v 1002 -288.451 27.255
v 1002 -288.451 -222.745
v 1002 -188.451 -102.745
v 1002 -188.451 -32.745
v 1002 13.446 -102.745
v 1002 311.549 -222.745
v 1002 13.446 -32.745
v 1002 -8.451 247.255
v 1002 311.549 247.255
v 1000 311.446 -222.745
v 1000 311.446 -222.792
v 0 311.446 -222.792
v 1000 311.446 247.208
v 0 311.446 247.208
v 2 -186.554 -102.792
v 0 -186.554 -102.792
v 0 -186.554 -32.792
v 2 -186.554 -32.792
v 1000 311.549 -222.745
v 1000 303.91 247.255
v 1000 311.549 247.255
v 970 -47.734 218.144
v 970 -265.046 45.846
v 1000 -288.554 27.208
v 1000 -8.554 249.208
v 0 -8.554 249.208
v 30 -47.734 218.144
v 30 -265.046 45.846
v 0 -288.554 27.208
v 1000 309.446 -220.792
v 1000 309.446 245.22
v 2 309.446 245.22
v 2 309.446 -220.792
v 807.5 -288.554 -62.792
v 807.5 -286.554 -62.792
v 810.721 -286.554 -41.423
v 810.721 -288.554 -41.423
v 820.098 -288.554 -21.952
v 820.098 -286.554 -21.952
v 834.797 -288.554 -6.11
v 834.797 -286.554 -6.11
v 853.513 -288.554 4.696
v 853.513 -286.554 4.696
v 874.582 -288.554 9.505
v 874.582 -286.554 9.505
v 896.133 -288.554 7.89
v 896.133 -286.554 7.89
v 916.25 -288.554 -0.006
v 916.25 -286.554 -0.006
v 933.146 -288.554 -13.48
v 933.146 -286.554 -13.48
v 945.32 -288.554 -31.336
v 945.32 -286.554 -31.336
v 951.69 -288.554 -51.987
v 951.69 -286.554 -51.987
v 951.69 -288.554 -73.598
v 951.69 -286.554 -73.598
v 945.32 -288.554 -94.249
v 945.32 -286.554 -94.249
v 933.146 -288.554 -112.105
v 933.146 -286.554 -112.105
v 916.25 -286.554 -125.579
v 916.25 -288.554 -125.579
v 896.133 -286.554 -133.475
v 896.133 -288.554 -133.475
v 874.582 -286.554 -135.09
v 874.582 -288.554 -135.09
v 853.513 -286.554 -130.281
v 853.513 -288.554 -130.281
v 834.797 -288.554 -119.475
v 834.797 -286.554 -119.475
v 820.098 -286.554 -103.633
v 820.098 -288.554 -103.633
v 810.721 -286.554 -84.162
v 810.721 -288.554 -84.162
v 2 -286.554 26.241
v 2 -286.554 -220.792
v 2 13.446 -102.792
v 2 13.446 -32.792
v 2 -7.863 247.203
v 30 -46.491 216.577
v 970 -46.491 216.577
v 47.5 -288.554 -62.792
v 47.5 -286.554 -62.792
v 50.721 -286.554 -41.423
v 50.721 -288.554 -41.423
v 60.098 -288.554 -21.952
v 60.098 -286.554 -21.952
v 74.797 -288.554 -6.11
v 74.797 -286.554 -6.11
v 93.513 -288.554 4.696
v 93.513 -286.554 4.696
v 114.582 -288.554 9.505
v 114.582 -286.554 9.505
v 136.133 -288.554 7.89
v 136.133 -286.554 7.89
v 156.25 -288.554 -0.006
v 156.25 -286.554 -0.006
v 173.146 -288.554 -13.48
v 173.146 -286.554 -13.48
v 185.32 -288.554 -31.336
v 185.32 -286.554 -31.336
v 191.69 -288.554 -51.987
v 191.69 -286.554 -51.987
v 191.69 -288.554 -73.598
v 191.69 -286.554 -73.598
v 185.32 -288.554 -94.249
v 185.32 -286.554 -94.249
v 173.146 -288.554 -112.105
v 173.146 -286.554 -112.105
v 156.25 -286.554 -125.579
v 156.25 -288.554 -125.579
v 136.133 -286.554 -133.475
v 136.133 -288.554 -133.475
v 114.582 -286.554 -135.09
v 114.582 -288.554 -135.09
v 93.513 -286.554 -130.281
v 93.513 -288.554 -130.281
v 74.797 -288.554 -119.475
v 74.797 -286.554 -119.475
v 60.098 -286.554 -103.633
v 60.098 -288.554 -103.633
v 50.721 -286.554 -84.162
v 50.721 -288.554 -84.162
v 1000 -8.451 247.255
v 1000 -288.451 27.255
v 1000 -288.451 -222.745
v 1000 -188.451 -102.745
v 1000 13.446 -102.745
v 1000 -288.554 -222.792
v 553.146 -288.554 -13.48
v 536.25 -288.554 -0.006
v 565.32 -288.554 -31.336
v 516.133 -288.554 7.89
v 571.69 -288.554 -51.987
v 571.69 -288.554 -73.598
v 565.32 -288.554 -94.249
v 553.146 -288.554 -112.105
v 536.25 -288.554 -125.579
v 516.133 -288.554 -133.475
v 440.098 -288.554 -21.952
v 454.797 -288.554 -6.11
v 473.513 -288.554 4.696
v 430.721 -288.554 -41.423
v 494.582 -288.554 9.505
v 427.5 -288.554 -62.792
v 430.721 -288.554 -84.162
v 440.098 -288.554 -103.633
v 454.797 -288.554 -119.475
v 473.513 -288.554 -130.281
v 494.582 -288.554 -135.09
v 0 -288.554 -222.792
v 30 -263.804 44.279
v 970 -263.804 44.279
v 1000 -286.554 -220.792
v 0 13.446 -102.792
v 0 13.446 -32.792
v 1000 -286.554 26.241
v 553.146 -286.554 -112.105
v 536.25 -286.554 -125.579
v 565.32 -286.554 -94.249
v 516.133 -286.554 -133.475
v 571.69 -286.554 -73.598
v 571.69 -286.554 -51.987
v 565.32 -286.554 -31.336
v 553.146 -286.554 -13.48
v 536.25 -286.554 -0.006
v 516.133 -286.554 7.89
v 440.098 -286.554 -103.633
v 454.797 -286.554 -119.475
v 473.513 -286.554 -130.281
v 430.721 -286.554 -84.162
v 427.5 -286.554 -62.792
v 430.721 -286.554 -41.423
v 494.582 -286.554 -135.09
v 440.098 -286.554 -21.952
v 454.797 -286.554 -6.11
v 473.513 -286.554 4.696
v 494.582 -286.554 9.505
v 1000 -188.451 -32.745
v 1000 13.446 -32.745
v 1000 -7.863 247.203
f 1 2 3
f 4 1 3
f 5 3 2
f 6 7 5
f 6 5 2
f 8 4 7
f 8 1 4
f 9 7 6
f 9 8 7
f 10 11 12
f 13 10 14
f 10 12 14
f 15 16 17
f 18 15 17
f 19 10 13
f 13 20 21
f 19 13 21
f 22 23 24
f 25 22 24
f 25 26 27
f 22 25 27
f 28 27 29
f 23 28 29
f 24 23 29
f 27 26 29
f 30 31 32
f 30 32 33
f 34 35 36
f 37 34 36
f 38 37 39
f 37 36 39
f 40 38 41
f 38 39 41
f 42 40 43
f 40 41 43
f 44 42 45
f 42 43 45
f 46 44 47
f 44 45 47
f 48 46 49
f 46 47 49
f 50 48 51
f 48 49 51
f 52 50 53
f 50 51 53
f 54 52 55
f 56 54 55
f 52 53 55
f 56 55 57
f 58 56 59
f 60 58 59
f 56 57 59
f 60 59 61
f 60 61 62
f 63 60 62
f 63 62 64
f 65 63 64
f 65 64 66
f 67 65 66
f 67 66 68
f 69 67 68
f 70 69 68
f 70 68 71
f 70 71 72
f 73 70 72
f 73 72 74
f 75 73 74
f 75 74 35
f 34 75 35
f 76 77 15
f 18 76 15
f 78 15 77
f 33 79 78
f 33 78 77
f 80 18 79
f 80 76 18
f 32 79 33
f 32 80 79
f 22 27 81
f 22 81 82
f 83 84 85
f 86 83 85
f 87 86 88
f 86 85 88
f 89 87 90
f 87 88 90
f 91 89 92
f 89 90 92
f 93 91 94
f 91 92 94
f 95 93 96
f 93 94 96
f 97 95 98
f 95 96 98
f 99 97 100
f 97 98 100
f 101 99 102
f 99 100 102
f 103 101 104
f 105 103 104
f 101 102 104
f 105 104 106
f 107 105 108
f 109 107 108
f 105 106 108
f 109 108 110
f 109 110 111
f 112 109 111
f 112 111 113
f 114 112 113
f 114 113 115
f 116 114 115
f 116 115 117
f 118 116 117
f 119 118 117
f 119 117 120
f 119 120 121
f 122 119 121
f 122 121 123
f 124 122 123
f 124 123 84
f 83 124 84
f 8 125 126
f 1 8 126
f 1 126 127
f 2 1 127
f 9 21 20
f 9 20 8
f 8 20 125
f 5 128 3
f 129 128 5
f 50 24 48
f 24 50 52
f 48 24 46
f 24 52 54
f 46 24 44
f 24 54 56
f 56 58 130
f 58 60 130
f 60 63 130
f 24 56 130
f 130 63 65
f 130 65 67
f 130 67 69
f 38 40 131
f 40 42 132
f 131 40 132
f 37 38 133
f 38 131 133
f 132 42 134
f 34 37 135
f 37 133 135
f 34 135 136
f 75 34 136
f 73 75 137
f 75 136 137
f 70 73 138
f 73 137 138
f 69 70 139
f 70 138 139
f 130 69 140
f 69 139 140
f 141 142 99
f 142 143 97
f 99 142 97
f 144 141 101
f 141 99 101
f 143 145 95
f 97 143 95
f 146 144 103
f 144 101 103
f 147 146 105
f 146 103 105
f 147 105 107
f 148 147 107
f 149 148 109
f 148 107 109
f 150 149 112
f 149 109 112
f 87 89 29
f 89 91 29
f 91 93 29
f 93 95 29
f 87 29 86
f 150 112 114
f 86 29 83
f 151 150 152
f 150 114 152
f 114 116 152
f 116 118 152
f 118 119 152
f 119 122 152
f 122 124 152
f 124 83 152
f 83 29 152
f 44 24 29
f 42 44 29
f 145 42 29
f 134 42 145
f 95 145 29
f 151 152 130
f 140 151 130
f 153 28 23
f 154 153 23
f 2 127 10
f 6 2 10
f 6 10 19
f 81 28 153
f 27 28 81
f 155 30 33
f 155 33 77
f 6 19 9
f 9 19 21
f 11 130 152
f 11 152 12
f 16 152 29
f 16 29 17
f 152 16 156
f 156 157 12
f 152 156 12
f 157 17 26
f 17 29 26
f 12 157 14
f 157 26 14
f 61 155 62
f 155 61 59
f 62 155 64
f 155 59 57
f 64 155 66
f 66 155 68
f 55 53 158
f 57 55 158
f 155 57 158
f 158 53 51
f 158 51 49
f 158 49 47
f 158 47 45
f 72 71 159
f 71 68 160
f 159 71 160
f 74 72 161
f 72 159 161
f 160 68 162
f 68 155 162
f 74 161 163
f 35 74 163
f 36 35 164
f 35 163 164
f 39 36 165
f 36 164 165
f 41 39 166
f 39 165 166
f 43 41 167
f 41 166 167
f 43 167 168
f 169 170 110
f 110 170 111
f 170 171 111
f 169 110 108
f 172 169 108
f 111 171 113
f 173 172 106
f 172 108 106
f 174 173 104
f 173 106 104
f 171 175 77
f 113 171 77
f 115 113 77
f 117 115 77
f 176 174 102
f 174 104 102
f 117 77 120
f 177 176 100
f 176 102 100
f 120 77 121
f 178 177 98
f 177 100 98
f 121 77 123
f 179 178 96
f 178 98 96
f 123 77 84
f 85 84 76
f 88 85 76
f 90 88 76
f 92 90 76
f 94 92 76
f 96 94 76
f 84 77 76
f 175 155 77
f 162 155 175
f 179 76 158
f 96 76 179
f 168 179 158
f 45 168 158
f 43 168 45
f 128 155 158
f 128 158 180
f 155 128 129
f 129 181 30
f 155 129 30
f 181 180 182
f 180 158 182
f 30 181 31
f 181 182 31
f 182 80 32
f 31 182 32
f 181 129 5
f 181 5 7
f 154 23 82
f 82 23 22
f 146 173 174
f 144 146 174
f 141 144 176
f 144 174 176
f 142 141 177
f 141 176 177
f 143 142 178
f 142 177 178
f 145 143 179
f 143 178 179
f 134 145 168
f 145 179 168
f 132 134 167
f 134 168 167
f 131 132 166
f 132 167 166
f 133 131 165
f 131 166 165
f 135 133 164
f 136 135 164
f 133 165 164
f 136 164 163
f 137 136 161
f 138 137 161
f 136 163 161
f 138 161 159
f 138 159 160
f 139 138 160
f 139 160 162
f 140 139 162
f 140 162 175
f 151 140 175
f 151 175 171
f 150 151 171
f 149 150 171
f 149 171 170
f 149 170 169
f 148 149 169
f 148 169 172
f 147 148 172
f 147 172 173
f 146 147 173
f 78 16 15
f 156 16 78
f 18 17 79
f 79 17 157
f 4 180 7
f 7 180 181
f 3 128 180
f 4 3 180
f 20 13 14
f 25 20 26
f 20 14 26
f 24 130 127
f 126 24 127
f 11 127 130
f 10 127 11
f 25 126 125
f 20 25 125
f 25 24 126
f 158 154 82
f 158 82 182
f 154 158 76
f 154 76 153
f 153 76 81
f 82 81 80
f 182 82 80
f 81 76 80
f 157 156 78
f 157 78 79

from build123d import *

# Parameters (mm, degrees)
F2_DEPTH = 1000
F3_W     = 940
F3_H     = 277.328980073
F4_DEPTH = 5
F6_D     = 145
F6_DEPTH = 4
F6_TIP   = 43.5623948795
F1_W     = 200
F1_H     = 70
F7_DEPTH = 2
F8_W     = 201.8966459586
F8_H     = 70
F9_DEPTH = 2


with BuildPart() as f2:
    # F1 (on Right) → F2 (new body)
    with BuildSketch(Plane.YZ):
        Polygon((-288.5542339748, 27.2076225815), (-288.5542339748, -222.7923774185), (311.4457660252, -222.7923774185), (311.4457660252, 247.2076225815), (-8.5542339748, 249.2076225815), align=None)
        Polygon((-286.5542339748, 26.2409870095), (-7.8630740966, 247.2032637701), (309.4457660252, 245.2200835194), (309.4457660252, -220.7923774185), (-286.5542339748, -220.7923774185), align=None, mode=Mode.SUBTRACT)
    extrude(amount=F2_DEPTH)

    # F3 (on face) → F4 (cut)
    with BuildSketch(Plane(origin=(0, -124.6227615588, 157.1818614256), x_dir=(1, 0, 0), z_dir=(0, -0.6212762255, 0.7835916358))):
        with Locations((500, -40.5407451073)):
            Rectangle(F3_W, F3_H)
    extrude(amount=-F4_DEPTH, mode=Mode.SUBTRACT)

    # F6
    with Locations(Plane.XZ.offset(288.5542339748)):
        with Locations((120, -62.7923774185), (500, -62.7923774185), (880, -62.7923774185)):
            Hole(F6_D / 2, depth=F6_DEPTH)
            with Locations((0, 0, -(F6_DEPTH + F6_TIP / 2))):  # 118° drill point
                Cone(0, F6_D / 2, F6_TIP, mode=Mode.SUBTRACT)

    # F1 (on Right) → F7 (join)
    with BuildSketch(Plane.YZ):
        Polygon((309.4457660252, 245.2200835194), (-7.8630740966, 247.2032637701), (-286.5542339748, 26.2409870095), (-286.5542339748, -220.7923774185), (309.4457660252, -220.7923774185), align=None)
        with Locations((-86.5542339748, -67.7923774185)):
            Rectangle(F1_W, F1_H, mode=Mode.SUBTRACT)
    extrude(amount=F7_DEPTH)

    # F8 (on face) → F9 (join)
    with BuildSketch(Plane.YZ.offset(1000)):
        Polygon((-288.4508799334, 27.2547214809), (-288.4508799334, -222.7452785191), (311.5491200666, -222.7452785191), (311.5491200666, 247.2547214809), (-8.4508799334, 247.2547214809), align=None)
        with Locations((-87.5025569541, -67.7452785191)):
            Rectangle(F8_W, F8_H, mode=Mode.SUBTRACT)
    extrude(amount=F9_DEPTH)


solid = f2.part
